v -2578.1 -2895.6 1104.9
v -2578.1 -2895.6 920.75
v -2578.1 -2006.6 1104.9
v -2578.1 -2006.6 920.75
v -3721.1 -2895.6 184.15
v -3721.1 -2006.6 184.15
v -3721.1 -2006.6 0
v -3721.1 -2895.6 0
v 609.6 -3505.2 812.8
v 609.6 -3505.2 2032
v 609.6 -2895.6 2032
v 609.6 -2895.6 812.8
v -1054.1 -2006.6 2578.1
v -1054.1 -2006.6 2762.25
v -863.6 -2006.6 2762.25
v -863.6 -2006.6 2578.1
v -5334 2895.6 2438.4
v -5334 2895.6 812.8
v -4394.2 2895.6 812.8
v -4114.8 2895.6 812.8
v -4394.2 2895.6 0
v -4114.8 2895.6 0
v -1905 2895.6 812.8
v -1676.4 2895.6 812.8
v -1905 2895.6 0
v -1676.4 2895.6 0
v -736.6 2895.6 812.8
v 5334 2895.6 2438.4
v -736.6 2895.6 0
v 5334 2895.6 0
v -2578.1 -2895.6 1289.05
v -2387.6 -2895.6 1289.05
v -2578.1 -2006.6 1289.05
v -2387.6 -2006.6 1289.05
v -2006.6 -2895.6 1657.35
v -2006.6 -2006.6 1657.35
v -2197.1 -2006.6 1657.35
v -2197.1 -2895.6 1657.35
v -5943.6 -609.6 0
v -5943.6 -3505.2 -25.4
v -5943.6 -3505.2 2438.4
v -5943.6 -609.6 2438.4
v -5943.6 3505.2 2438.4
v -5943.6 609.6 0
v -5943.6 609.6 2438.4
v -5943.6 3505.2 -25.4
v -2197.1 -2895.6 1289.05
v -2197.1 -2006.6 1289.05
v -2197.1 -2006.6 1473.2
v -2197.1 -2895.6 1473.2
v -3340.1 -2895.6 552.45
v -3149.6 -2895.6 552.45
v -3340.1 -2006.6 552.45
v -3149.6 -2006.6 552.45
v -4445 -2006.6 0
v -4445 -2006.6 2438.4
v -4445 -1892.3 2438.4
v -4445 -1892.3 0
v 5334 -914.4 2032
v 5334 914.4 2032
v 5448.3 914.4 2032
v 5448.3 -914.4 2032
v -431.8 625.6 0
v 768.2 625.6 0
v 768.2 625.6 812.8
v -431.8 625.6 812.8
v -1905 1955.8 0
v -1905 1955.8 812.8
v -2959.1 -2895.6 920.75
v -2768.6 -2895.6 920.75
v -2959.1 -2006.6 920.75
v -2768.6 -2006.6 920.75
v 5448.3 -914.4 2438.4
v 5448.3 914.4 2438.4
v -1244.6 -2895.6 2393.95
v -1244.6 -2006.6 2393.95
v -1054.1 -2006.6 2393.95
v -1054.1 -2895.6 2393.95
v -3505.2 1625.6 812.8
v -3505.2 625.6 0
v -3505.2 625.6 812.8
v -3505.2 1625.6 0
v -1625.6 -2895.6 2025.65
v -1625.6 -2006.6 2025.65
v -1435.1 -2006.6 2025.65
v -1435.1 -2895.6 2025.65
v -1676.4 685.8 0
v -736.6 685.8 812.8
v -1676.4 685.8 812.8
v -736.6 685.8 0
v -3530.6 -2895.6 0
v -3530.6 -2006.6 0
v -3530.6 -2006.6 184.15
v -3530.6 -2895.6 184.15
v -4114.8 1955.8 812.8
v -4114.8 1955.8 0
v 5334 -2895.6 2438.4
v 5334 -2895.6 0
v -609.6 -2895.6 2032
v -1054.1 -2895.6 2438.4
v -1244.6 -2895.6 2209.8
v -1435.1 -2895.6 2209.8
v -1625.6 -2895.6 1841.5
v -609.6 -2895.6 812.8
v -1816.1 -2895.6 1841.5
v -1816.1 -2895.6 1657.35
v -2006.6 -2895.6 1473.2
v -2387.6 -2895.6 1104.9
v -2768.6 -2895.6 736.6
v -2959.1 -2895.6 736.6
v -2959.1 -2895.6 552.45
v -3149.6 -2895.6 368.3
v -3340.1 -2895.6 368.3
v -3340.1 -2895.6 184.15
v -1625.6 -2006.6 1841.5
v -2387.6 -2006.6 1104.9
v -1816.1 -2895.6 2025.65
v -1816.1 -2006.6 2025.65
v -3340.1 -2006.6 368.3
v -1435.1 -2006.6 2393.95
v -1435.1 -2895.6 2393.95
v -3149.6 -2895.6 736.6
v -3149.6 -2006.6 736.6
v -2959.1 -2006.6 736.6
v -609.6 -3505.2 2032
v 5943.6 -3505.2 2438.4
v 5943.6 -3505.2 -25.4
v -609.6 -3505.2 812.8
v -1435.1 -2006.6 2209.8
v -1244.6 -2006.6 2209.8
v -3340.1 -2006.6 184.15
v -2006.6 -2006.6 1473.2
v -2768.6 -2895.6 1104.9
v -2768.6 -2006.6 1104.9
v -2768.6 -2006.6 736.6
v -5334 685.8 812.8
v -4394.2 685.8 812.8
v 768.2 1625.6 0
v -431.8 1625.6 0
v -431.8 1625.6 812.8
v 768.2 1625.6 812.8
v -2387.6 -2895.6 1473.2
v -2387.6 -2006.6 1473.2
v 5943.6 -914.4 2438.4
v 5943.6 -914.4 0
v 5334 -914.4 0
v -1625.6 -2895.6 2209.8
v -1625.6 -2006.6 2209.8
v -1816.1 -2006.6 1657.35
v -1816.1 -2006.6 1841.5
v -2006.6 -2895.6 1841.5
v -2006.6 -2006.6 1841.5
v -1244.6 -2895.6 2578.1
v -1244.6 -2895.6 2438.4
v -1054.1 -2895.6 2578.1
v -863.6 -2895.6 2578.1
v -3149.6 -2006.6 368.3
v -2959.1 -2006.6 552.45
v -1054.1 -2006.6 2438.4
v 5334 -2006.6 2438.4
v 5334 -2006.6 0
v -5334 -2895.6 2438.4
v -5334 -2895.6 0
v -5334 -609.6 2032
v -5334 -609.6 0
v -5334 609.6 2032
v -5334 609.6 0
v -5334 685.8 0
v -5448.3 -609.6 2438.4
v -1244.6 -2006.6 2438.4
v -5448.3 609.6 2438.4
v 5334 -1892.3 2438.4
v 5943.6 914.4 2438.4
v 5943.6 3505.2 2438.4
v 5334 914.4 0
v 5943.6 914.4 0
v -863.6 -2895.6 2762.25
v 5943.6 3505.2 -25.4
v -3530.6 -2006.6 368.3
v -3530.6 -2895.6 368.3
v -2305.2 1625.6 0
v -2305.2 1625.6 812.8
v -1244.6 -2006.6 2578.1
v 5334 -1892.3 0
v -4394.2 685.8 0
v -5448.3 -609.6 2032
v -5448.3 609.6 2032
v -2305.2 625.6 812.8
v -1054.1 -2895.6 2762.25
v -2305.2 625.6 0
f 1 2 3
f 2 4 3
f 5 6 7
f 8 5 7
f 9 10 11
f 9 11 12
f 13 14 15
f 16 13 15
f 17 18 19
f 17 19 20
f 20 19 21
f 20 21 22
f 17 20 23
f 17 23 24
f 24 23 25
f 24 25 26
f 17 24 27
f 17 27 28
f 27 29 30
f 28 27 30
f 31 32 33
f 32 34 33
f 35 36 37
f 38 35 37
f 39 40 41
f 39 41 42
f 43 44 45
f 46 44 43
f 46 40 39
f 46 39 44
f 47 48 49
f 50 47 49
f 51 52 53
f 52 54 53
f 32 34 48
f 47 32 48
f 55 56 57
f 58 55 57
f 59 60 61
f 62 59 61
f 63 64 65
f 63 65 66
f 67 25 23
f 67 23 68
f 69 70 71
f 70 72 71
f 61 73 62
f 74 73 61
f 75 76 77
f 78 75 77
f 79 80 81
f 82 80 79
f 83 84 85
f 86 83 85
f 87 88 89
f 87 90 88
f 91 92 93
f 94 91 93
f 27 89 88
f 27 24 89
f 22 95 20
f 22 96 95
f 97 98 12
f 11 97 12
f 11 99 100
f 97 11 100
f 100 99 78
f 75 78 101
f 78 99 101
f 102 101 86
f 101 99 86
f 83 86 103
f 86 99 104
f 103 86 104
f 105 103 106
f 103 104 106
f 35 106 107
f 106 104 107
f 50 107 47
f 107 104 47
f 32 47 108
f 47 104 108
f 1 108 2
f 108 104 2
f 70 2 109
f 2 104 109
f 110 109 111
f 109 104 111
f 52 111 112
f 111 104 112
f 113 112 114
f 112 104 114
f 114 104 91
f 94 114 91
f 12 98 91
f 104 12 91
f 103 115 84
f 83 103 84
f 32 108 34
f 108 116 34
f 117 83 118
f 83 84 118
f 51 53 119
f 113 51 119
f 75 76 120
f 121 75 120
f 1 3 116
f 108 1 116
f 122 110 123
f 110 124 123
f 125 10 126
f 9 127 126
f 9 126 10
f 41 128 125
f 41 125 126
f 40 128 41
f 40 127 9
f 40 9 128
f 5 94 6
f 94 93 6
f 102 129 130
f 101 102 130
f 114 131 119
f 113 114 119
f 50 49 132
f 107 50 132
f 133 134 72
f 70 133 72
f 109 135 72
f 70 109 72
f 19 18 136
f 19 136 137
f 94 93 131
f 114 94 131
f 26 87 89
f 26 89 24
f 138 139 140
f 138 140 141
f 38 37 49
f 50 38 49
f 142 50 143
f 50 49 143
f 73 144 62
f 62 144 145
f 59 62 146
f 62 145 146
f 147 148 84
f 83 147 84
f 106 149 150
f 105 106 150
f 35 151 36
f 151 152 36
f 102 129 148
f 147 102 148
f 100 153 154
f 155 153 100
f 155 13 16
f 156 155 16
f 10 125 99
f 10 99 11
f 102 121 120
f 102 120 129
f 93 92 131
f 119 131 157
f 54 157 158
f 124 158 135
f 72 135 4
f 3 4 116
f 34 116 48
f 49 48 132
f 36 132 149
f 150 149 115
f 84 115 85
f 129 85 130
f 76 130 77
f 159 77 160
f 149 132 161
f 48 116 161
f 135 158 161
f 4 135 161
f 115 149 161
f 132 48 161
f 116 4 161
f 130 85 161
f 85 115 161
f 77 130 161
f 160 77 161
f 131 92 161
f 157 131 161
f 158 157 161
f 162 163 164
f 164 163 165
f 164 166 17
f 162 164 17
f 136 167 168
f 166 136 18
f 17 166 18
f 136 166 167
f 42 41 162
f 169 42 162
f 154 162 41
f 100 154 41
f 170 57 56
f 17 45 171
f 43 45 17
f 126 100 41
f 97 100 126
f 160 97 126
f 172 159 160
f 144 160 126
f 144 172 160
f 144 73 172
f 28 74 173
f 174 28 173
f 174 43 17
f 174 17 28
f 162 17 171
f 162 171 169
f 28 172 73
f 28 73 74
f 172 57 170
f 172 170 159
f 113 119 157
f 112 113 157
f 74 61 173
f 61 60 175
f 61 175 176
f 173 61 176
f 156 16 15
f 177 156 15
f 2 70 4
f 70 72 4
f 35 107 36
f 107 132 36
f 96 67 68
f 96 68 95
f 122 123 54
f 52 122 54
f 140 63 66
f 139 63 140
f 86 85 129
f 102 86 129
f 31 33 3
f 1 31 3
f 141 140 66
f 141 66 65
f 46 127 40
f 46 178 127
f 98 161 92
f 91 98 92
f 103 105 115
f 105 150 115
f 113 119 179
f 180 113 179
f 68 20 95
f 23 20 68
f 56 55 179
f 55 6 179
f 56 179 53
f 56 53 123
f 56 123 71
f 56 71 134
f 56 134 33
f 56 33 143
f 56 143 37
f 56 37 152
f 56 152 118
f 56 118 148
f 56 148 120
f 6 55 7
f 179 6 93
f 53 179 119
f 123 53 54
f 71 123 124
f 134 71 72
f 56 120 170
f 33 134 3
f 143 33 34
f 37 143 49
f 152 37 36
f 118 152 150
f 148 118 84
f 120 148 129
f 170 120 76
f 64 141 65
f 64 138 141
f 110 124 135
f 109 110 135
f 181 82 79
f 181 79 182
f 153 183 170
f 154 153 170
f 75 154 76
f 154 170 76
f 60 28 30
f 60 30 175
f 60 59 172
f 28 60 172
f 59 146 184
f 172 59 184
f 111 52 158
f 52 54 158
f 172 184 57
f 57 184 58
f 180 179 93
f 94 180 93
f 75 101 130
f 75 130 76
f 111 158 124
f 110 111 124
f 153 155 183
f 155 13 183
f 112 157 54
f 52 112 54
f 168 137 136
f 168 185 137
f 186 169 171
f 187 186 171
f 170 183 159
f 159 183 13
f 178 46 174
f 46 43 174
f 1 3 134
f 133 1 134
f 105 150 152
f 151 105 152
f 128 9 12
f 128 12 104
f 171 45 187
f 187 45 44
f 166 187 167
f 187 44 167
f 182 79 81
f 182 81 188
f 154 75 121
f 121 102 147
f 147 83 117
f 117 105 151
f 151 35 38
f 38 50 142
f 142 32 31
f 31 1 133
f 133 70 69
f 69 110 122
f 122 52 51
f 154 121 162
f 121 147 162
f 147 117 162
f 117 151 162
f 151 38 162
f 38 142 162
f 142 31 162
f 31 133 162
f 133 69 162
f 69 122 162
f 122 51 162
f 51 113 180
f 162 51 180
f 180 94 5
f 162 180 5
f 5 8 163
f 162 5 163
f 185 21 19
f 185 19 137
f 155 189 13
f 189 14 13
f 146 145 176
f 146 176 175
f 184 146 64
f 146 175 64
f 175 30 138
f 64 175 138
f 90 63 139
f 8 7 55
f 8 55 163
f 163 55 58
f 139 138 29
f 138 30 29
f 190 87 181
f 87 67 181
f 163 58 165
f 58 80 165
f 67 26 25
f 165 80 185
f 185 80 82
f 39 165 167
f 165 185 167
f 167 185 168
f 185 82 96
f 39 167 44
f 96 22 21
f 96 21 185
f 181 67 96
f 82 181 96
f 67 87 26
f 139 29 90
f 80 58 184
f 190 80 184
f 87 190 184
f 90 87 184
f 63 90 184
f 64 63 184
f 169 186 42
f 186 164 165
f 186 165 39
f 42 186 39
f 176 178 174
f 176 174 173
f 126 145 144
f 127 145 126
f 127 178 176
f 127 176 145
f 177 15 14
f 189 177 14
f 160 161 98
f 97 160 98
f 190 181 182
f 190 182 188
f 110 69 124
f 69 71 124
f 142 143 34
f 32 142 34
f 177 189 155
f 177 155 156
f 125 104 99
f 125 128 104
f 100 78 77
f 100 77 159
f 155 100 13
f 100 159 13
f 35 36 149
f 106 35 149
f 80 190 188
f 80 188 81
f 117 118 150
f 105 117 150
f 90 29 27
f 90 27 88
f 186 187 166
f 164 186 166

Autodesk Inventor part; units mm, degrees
ref_plane "YZ Plane" through (0, 0, 0) normal (1, 0, 0) x (0, 1, 0)
ref_plane "XZ Plane" through (0, 0, 0) normal (0, 1, 0) x (-1, 0, 0)
ref_plane "XY Plane" through (0, 0, 0) normal (0, 0, 1) x (1, 0, 0)
sketch "Sketch1" plane through (0, 0, 0) normal (0, 0, 1) x (1, 0, 0)
  line L0 (-8321.04, 0) -> (8321.04, 0) projected
  line L1 (-5943.6, 3505.2) -> (5943.6, 3505.2)
  line L2 (-5334, 2895.6) -> (5334, 2895.6)
  line L3 (-4572, 2895.6) -> (-4419.6, 2895.6)
  line L4 (-1981.2, -2006.6) -> (-4445, -2006.6)
  line L5 (-4445, -2006.6) -> (-4445, -1892.3)
  line L6 (-1219.2, -2895.6) -> (-1066.8, -2895.6)
  line L7 (5334, -2895.6) -> (0, -2895.6)
  line L8 (0, -2895.6) -> (-5334, -2895.6)
  line L9 (5943.6, -3505.2) -> (0, -3505.2)
  line L10 (0, -3505.2) -> (-5943.6, -3505.2)
  line L11 (5334, 914.4) -> (5943.6, 914.4)
  line L12 (5943.6, -914.4) -> (5334, -914.4)
  line L13 (5334, 2895.6) -> (5334, 914.4)
  line L14 (5334, -914.4) -> (5334, -2895.6)
  line L15 (5943.6, 3505.2) -> (5943.6, 914.4)
  line L16 (5943.6, -914.4) -> (5943.6, -3505.2)
  line L17 (-4445, -2006.6) -> (5334, -2006.6)
  line L18 (5334, -1892.3) -> (-4445, -1892.3)
  line L19 (-4445, -1892.3) -> (-4445, -2006.6)
  line L20 (5334, -1892.3) -> (5334, -2006.6)
  line L21 (-5943.6, 609.6) -> (-5334, 609.6)
  line L22 (-5334, -609.6) -> (-5943.6, -609.6)
  line L23 (-5943.6, -3505.2) -> (-5943.6, -609.6)
  line L24 (-5943.6, 609.6) -> (-5943.6, 3505.2)
  line L25 (-5334, -2895.6) -> (-5334, -609.6)
  line L26 (-5334, 609.6) -> (-5334, 2895.6)
  line L27 (-4445, -2006.6) -> (-4419.6, -2006.6)
  line L28 (-4419.6, 2895.6) -> (-4572, 2895.6)
  line L29 (-4445, -1892.3) -> (-4445, -2006.6)
  line L30 (0, -4907.28) -> (0, 4907.28) projected
  dimension "d18" = 7010.4
  dimension "d19" = 609.6
  dimension "d20" = 609.6
  dimension "d23" = 1828.8
  dimension "d24" = 2590.8
  dimension "d25" = 609.6
  dimension "d28" = 114.3
  dimension "d29" = 0
  dimension "d34" = 1219.2
  dimension "d35" = 2895.6
  dimension "d36" = 609.6
  dimension "d46" = 889
  dimension "d105" = 889
  dimension "d106" = 11887.2
extrude "Extrusion9" add sketch "Sketch1" along normal blind 2438.4 contours L18 L14 L17 L30 | L30 L17 L4 L5 L18 | L1 L30 L2 L26 L21 L24 | L1 L15 L11 L13 L2 L30 | L14 L12 L16 L9 L30 L7 | L30 L10 L23 L22 L25 L8 L6
sketch "Sketch8" plane through (0, 0, 0) normal (0, 0, -1) x (-1, 0, 0)
  line L0 (5943.6, 3505.2) -> (-5943.6, 3505.2) projected
  line L1 (-5943.6, 3505.2) -> (-5943.6, 914.4) projected
  line L2 (-5943.6, 914.4) -> (-5334, 914.4) projected
  line L3 (-5334, 914.4) -> (-5334, 2895.6) projected
  line L4 (-5334, 2895.6) -> (5334, 2895.6) projected
  line L5 (5334, 2895.6) -> (5334, 609.6) projected
  line L6 (5334, 609.6) -> (5943.6, 609.6) projected
  line L7 (5943.6, 609.6) -> (5943.6, 3505.2) projected
  line L8 (-5943.6, 3505.2) -> (5943.6, 3505.2)
  line L9 (5943.6, 3505.2) -> (5943.6, -3505.2)
  line L10 (5943.6, -3505.2) -> (-5943.6, -3505.2)
  line L11 (-5943.6, -3505.2) -> (-5943.6, 3505.2)
  point P0 (0, 0)
extrude "Extrusion10" add sketch "Sketch8" along normal blind 25.4
sketch "Sketch10" plane through (-4445, -2006.6, 2438.4) normal (0, -1, 0) x (1, 0, 0)
  line L0 (0, -2438.4) -> (9779, -2438.4) projected
  line L1 (0, -2438.4) -> (0, 0) projected
  line L2 (723.9, -2438.4) -> (914.4, -2438.4)
  line L3 (914.4, -2438.4) -> (914.4, -2254.25)
  line L4 (914.4, -2254.25) -> (723.9, -2254.25)
  line L5 (723.9, -2254.25) -> (723.9, -2438.4)
  line L6 (914.4, -2254.25) -> (1104.9, -2254.25)
  line L7 (1104.9, -2254.25) -> (1104.9, -2070.1)
  line L8 (1104.9, -2070.1) -> (914.4, -2070.1)
  line L9 (914.4, -2070.1) -> (914.4, -2254.25)
  line L10 (1104.9, -2070.1) -> (1295.4, -2070.1)
  line L11 (1295.4, -2070.1) -> (1295.4, -1885.95)
  line L12 (1295.4, -1885.95) -> (1104.9, -1885.95)
  line L13 (1104.9, -1885.95) -> (1104.9, -2070.1)
  line L14 (1295.4, -1885.95) -> (1485.9, -1885.95)
  line L15 (1485.9, -1885.95) -> (1485.9, -1701.8)
  line L16 (1485.9, -1701.8) -> (1295.4, -1701.8)
  line L17 (1295.4, -1701.8) -> (1295.4, -1885.95)
  line L18 (1485.9, -1701.8) -> (1676.4, -1701.8)
  line L19 (1676.4, -1701.8) -> (1676.4, -1517.65)
  line L20 (1676.4, -1517.65) -> (1485.9, -1517.65)
  line L21 (1485.9, -1517.65) -> (1485.9, -1701.8)
  line L22 (1676.4, -1517.65) -> (1866.9, -1517.65)
  line L23 (1866.9, -1517.65) -> (1866.9, -1333.5)
  line L24 (1866.9, -1333.5) -> (1676.4, -1333.5)
  line L25 (1676.4, -1333.5) -> (1676.4, -1517.65)
  line L26 (1866.9, -1333.5) -> (2057.4, -1333.5)
  line L27 (2057.4, -1333.5) -> (2057.4, -1149.35)
  line L28 (2057.4, -1149.35) -> (1866.9, -1149.35)
  line L29 (1866.9, -1149.35) -> (1866.9, -1333.5)
  line L30 (2438.4, -965.2) -> (2438.4, -781.05)
  line L31 (2247.9, -1149.35) -> (2247.9, -965.2)
  line L32 (2247.9, -965.2) -> (2438.4, -965.2)
  line L33 (2438.4, -781.05) -> (2247.9, -781.05)
  line L34 (2247.9, -781.05) -> (2247.9, -965.2)
  line L35 (2057.4, -1149.35) -> (2247.9, -1149.35)
  line L36 (2247.9, -965.2) -> (2057.4, -965.2)
  line L37 (2057.4, -965.2) -> (2057.4, -1149.35)
  line L38 (2628.9, -781.05) -> (2628.9, -596.9)
  line L39 (2438.4, -781.05) -> (2628.9, -781.05)
  line L40 (2628.9, -596.9) -> (2438.4, -596.9)
  line L41 (2438.4, -596.9) -> (2438.4, -781.05)
  line L42 (3200.4, -228.6) -> (3200.4, -44.45)
  line L43 (3200.4, 139.7) -> (3200.4, -44.45)
  line L44 (3200.4, -44.45) -> (3390.9, -44.45)
  line L45 (3390.9, 139.7) -> (3200.4, 139.7)
  line L46 (3009.9, -44.45) -> (3009.9, -228.6)
  line L47 (3009.9, -228.6) -> (3200.4, -228.6)
  line L48 (3200.4, -44.45) -> (3009.9, -44.45)
  line L49 (3390.9, -44.45) -> (3390.9, 139.7)
  line L50 (3009.9, -412.75) -> (3009.9, -228.6)
  line L51 (3009.9, -228.6) -> (2819.4, -228.6)
  line L52 (2819.4, -412.75) -> (3009.9, -412.75)
  line L53 (2819.4, -228.6) -> (2819.4, -412.75)
  line L54 (2819.4, -596.9) -> (2819.4, -412.75)
  line L55 (2819.4, -412.75) -> (2628.9, -412.75)
  line L56 (2628.9, -596.9) -> (2819.4, -596.9)
  line L57 (2628.9, -412.75) -> (2628.9, -596.9)
  line L58 (3390.9, 139.7) -> (3581.4, 139.7)
  line L59 (3581.4, 139.7) -> (3581.4, 323.85)
  line L60 (3581.4, 323.85) -> (3390.9, 323.85)
  line L61 (3390.9, 323.85) -> (3390.9, 139.7)
  point P0 (8445.5, -2438.4)
  point P1 (4445, -2438.4)
  dimension "d113" = 190.5
  dimension "d115" = 184.15
  dimension "d116" = 723.9
  dimension "d117" = 190.5
  dimension "d118" = 184.15
  dimension "d119" = 190.5
  dimension "d120" = 184.15
  dimension "d121" = 190.5
  dimension "d122" = 184.15
  dimension "d123" = 190.5
  dimension "d124" = 184.15
  dimension "d125" = 190.5
  dimension "d126" = 184.15
  dimension "d127" = 190.5
  dimension "d128" = 184.15
  dimension "d129" = 190.5
  dimension "d130" = 184.15
  dimension "d131" = 190.5
  dimension "d132" = 184.15
  dimension "d133" = 190.5
  dimension "d134" = 184.15
  dimension "d135" = 190.5
  dimension "d136" = 184.15
  dimension "d137" = 190.5
  dimension "d138" = 184.15
  dimension "d139" = 190.5
  dimension "d140" = 184.15
  dimension "d141" = 190.5
  dimension "d142" = 184.15
  dimension "d154" = 184.15
  dimension "d155" = 190.5
extrude "Stairs" add sketch "Sketch10" along normal up to surface (889 mm away)
sketch "Sketch9" plane through (0, 0, 2438.4) normal (0, 0, 1) x (1, 0, 0)
  line L0 (5943.6, 3505.2) -> (-5943.6, 3505.2) projected
  line L1 (-5943.6, 3505.2) -> (-5943.6, 609.6) projected
  line L2 (-5943.6, 609.6) -> (-5334, 609.6) projected
  line L3 (-5334, 609.6) -> (-5334, 2895.6) projected
  line L4 (-5334, 2895.6) -> (5334, 2895.6) projected
  line L5 (5334, 2895.6) -> (5334, 914.4) projected
  line L6 (5334, 914.4) -> (5943.6, 914.4) projected
  line L7 (5943.6, 914.4) -> (5943.6, 3505.2) projected
  line L8 (-5943.6, 609.6) -> (-5334, 609.6)
  line L9 (-5334, 609.6) -> (-5334, -609.6)
  line L10 (-5334, -609.6) -> (-5943.6, -609.6)
  line L11 (-5943.6, -609.6) -> (-5943.6, 609.6)
  line L12 (5334, 914.4) -> (5943.6, 914.4)
  line L13 (5943.6, 914.4) -> (5943.6, -914.4)
  line L14 (5943.6, -914.4) -> (5334, -914.4)
  line L15 (5334, -914.4) -> (5334, 914.4)
  line L16 (-5943.6, 609.6) -> (-5334, 609.6) projected
  line L17 (5334, 914.4) -> (5943.6, 914.4) projected
  line L18 (-5334, -609.6) -> (-5448.3, -609.6)
  line L19 (-5448.3, -609.6) -> (-5448.3, 609.6)
  line L20 (-5448.3, 609.6) -> (-5334, 609.6)
  line L21 (-5334, 609.6) -> (-5334, -609.6)
  line L22 (5334, -914.4) -> (5448.3, -914.4)
  line L23 (5448.3, -914.4) -> (5448.3, 914.4)
  line L24 (5448.3, 914.4) -> (5334, 914.4)
  line L25 (5334, 914.4) -> (5334, -914.4)
  point P0 (0, 0)
  dimension "d241" = 114.3
  dimension "d242" = 114.3
extrude "Doorways" add sketch "Sketch9" against normal blind 406.4 contours L23 L14 L15 L6 | L2 L9 L10 L19
sketch "Sketch11" plane through (-5943.6, -3505.2, 2438.4) normal (0, -1, 0) x (1, 0, 0)
  line L0 (5334, -406.4) -> (6553.2, -406.4)
  line L1 (6553.2, -406.4) -> (6553.2, -1625.6)
  line L2 (6553.2, -1625.6) -> (5334, -1625.6)
  line L3 (5334, -1625.6) -> (5334, -406.4)
  line L4 (11277.6, -2438.4) -> (2413, -2438.4) projected
  line L5 (5943.6, -2956.56) -> (5943.6, 492.76) projected
  point P0 (5943.6, -2438.4)
  dimension "d145" = 1219.2
  dimension "d147" = 1219.2
  dimension "d148" = 812.8
extrude "Window" cut sketch "Sketch11" against normal up to surface (609.6 mm away)
sketch "Furniture1" plane through (0, 0, 0) normal (0, 0, 1) x (1, 0, 0)
  line L0 (5334, 2895.6) -> (-5334, 2895.6) projected
  line L1 (-5334, 2895.6) -> (-5334, 609.6) projected
  line L2 (-5334, 2895.6) -> (-4394.2, 2895.6)
  line L3 (-4394.2, 2895.6) -> (-4394.2, 685.8)
  line L4 (-4394.2, 685.8) -> (-5334, 685.8)
  line L5 (-5334, 685.8) -> (-5334, 2895.6)
  line L6 (-4114.8, 2895.6) -> (-1905, 2895.6)
  line L7 (-1905, 2895.6) -> (-1905, 1955.8)
  line L8 (-1905, 1955.8) -> (-4114.8, 1955.8)
  line L9 (-4114.8, 1955.8) -> (-4114.8, 2895.6)
  line L10 (-1676.4, 2895.6) -> (-736.6, 2895.6)
  line L11 (-736.6, 2895.6) -> (-736.6, 685.8)
  line L12 (-736.6, 685.8) -> (-1676.4, 685.8)
  line L13 (-1676.4, 685.8) -> (-1676.4, 2895.6)
  line L14 (-3505.2, 1625.6) -> (-2305.2, 1625.6)
  line L15 (-2305.2, 1625.6) -> (-2305.2, 625.6)
  line L16 (-2305.2, 625.6) -> (-3505.2, 625.6)
  line L17 (-3505.2, 625.6) -> (-3505.2, 1625.6)
  line L18 (-431.8, 1625.6) -> (768.2, 1625.6)
  line L19 (768.2, 1625.6) -> (768.2, 625.6)
  line L20 (768.2, 625.6) -> (-431.8, 625.6)
  line L21 (-431.8, 625.6) -> (-431.8, 1625.6)
  point P0 (0, 0)
  dimension "d247" = 1000
  dimension "d248" = 1200
  dimension "d249" = 1000
  dimension "d250" = 1200
  dimension "d251" = 1270
  dimension "d252" = 1828.8
  dimension "d253" = 304.8
  dimension "d254" = 2209.8
  dimension "d255" = 939.8
  dimension "d256" = 939.8
  dimension "d257" = 939.8
  dimension "d258" = 2209.8
  dimension "d259" = 1219.2
  dimension "d260" = 3657.6
extrude "Furniture+Pallets" add sketch "Furniture1" along normal blind 812.8
sketch "Instruments" plane through (0, 0, 0) normal (0, 0, 1) x (1, 0, 0)
  line L0 (5943.6, -914.4) -> (5334, -914.4) projected
  line L1 (5943.6, 914.4) -> (5334, 914.4) projected
  line L2 (-5334, 2895.6) -> (-5334, 609.6) projected
  line L3 (-5334, -609.6) -> (-5943.6, -609.6) projected
  line L4 (-8930.6312, 0) -> (8769.3036, 0) projected
  circle A0 centre (-1778, 0) radius 152.4
  circle A1 centre (1778, 0) radius 152.4
  circle A2 centre (-4889.5, -2451.1) radius 152.4
  line L5 (-5181.6, -152.4) -> (-5486.4, -152.4)
  line L6 (-5486.4, -152.4) -> (-5486.4, 152.4)
  line L7 (-5486.4, 152.4) -> (-5181.6, -152.4)
  line L8 (-5943.6, -3505.2) -> (-5943.6, 3505.2) projected
  line L9 (-5334, -609.6) -> (-5943.6, -609.6)
  line L10 (-5943.6, -609.6) -> (-5943.6, 609.6)
  line L11 (-5943.6, 609.6) -> (-5334, 609.6)
  line L12 (-5334, 609.6) -> (-5334, -609.6)
  line L13 (-5486.4, 609.6) -> (-5334, 609.6)
  line L14 (-5334, 609.6) -> (-5334, 457.2)
  line L15 (-5334, 457.2) -> (-5486.4, 457.2)
  line L16 (-5486.4, 457.2) -> (-5486.4, 609.6)
  line L17 (-5334, -609.6) -> (-5486.4, -609.6)
  line L18 (-5486.4, -609.6) -> (-5486.4, -457.2)
  line L19 (-5486.4, -457.2) -> (-5334, -457.2)
  line L20 (-5334, -457.2) -> (-5334, -609.6)
  line L21 (5943.6, 3505.2) -> (5943.6, -3505.2) projected
  line L22 (5486.4, 914.4) -> (5943.6, 914.4)
  line L23 (5943.6, 914.4) -> (5943.6, 1371.6)
  line L24 (5943.6, 1371.6) -> (5486.4, 1371.6)
  line L25 (5486.4, 1371.6) -> (5486.4, 914.4)
  line L26 (5943.6, -914.4) -> (5486.4, -914.4)
  line L27 (5486.4, -914.4) -> (5486.4, -1371.6)
  line L28 (5486.4, -1371.6) -> (5943.6, -1371.6)
  line L29 (5943.6, -1371.6) -> (5943.6, -914.4)
  line L30 (5486.4, 1371.6) -> (5943.6, 1371.6)
  line L31 (5943.6, 1371.6) -> (5943.6, -1371.6)
  line L32 (5943.6, -1371.6) -> (5486.4, -1371.6)
  line L33 (5334, 914.4) -> (5486.4, 914.4)
  line L34 (5486.4, 914.4) -> (5486.4, 0)
  line L35 (5486.4, 0) -> (5334, 0)
  line L36 (5334, 0) -> (5334, 914.4)
  line L37 (-5334, -2895.6) -> (-5334, 2895.6) projected
  line L38 (-1244.6, -2895.6) -> (-5334, -2895.6) projected
  line L39 (-5943.6, -609.6) -> (-5943.6, -3505.2) projected
  line L40 (-5943.6, -3505.2) -> (5943.6, -3505.2) projected
  line L41 (5943.6, -3505.2) -> (5943.6, -914.4) projected
  line L42 (5943.6, 3505.2) -> (-5943.6, 3505.2) projected
  line L43 (-5334, -2895.6) -> (-5334, 2895.6) projected
  line L44 (-5334, 2895.6) -> (5334, 2895.6) projected
  line L45 (5334, 2895.6) -> (5334, -1892.3) projected
  line L46 (5334, -1892.3) -> (-4445, -1892.3) projected
  line L47 (-4445, -1892.3) -> (-4445, -2006.6) projected
  line L48 (-4445, -2006.6) -> (-1244.6, -2006.6) projected
  line L49 (-1244.6, -2006.6) -> (-1054.1, -2006.6) projected
  line L50 (-1054.1, -2006.6) -> (5334, -2006.6) projected
  line L51 (5334, -2895.6) -> (-1054.1, -2895.6) projected
  line L52 (-1054.1, -2895.6) -> (-1244.6, -2895.6) projected
  line L53 (-1244.6, -2895.6) -> (-5334, -2895.6) projected
  line L54 (-5486.4, 457.2) -> (-5486.4, -457.2)
  line L55 (5486.4, 304.8) -> (5181.6, 304.8)
  line L56 (5181.6, 304.8) -> (5181.6, 609.6)
  line L57 (5486.4, 304.8) -> (5181.6, 609.6) construction
  line L58 (5181.6, 304.8) -> (5486.4, 609.6) construction
  line L59 (5181.6, 609.6) -> (5486.4, 304.8)
  line L60 (5486.4, -1371.6) -> (5486.4, 304.8)
  line L61 (5486.4, 609.6) -> (5486.4, 1371.6)
  line L62 (5181.6, -609.6) -> (5486.4, -609.6)
  line L63 (5181.6, -304.8) -> (5181.6, -609.6)
  line L64 (5181.6, -609.6) -> (5486.4, -304.8) construction
  line L65 (5486.4, -609.6) -> (5181.6, -304.8) construction
  line L66 (5181.6, -304.8) -> (5486.4, -609.6)
  line L67 (-5943.6, 3505.2) -> (-5943.6, 609.6) projected
  line L68 (-5943.6, 609.6) -> (-5448.3, 609.6) projected
  line L69 (5448.3, 914.4) -> (5943.6, 914.4) projected
  line L70 (5943.6, 914.4) -> (5943.6, 3505.2) projected
  line L71 (-5448.3, -609.6) -> (-5943.6, -609.6) projected
  line L72 (5943.6, -914.4) -> (5448.3, -914.4) projected
  line L73 (-5448.3, 609.6) -> (-5448.3, -609.6) projected
  line L74 (5448.3, -914.4) -> (5448.3, 914.4) projected
  line L75 (5334, -2006.6) -> (5334, -2895.6) projected
  point P0 (0, 0)
  point P1 (1.5875, 1.5875)
  point P2 (770.0638, -2405.9824)
  point P3 (-4729.4618, 0)
  point P4 (5334, 457.2)
  point P5 (5334, -457.2)
  dimension "d161" = 304.8
  dimension "d163" = 304.8
  dimension "d164" = 3556
  dimension "d165" = 7112
  dimension "d166" = 304.8
  dimension "d172" = 304.8
  dimension "d173" = 304.8
  dimension "d192" = 152.4
  dimension "d193" = 152.4
  dimension "d194" = 152.4
  dimension "d195" = 457.2
  dimension "d196" = 457.2
  dimension "d197" = 457.2
  dimension "d198" = 457.2
  dimension "d227" = 444.5
  dimension "d228" = 444.5
  dimension "d229" = 152.4
  dimension "d230" = 152.4
  dimension "d231" = 457.2
  dimension "d234" = 304.8
  dimension "d235" = 304.8
  dimension "d236" = 152.4
  dimension "d237" = 304.8
  dimension "d238" = 304.8
  dimension "d239" = 152.4
  dimension "d240" = 457.2
sketch "Furniture2" plane through (0, 0, 0) normal (0, 0, 1) x (1, 0, 0)
  line L0 (5334, 2895.6) -> (-5334, 2895.6) projected
  line L1 (-5334, 2895.6) -> (-4394.2, 2895.6)
  line L2 (-4394.2, 2895.6) -> (-4394.2, 685.8)
  line L3 (-4394.2, 685.8) -> (-5334, 685.8)
  line L4 (-5334, 685.8) -> (-5334, 2895.6)
  line L5 (-3175, 2895.6) -> (-2235.2, 2895.6)
  line L6 (-2235.2, 2895.6) -> (-2235.2, 685.8)
  line L7 (-2235.2, 685.8) -> (-3175, 685.8)
  line L8 (-3175, 685.8) -> (-3175, 2895.6)
  line L9 (-76.2, 2895.6) -> (-76.2, 685.8)
  line L10 (-76.2, 685.8) -> (-1016, 685.8)
  line L11 (-1016, 2895.6) -> (-76.2, 2895.6)
  line L12 (-1016, 685.8) -> (-1016, 2895.6)
  point P0 (0, 0)
  dimension "d261" = 2209.8
  dimension "d262" = 939.8
  dimension "d263" = 2209.8
  dimension "d264" = 939.8
  dimension "d265" = 2209.8
  dimension "d266" = 939.8
  dimension "d267" = 1219.2
  dimension "d268" = 1219.2
properties part number "West_Structure_1st_Floor_CAFS"
